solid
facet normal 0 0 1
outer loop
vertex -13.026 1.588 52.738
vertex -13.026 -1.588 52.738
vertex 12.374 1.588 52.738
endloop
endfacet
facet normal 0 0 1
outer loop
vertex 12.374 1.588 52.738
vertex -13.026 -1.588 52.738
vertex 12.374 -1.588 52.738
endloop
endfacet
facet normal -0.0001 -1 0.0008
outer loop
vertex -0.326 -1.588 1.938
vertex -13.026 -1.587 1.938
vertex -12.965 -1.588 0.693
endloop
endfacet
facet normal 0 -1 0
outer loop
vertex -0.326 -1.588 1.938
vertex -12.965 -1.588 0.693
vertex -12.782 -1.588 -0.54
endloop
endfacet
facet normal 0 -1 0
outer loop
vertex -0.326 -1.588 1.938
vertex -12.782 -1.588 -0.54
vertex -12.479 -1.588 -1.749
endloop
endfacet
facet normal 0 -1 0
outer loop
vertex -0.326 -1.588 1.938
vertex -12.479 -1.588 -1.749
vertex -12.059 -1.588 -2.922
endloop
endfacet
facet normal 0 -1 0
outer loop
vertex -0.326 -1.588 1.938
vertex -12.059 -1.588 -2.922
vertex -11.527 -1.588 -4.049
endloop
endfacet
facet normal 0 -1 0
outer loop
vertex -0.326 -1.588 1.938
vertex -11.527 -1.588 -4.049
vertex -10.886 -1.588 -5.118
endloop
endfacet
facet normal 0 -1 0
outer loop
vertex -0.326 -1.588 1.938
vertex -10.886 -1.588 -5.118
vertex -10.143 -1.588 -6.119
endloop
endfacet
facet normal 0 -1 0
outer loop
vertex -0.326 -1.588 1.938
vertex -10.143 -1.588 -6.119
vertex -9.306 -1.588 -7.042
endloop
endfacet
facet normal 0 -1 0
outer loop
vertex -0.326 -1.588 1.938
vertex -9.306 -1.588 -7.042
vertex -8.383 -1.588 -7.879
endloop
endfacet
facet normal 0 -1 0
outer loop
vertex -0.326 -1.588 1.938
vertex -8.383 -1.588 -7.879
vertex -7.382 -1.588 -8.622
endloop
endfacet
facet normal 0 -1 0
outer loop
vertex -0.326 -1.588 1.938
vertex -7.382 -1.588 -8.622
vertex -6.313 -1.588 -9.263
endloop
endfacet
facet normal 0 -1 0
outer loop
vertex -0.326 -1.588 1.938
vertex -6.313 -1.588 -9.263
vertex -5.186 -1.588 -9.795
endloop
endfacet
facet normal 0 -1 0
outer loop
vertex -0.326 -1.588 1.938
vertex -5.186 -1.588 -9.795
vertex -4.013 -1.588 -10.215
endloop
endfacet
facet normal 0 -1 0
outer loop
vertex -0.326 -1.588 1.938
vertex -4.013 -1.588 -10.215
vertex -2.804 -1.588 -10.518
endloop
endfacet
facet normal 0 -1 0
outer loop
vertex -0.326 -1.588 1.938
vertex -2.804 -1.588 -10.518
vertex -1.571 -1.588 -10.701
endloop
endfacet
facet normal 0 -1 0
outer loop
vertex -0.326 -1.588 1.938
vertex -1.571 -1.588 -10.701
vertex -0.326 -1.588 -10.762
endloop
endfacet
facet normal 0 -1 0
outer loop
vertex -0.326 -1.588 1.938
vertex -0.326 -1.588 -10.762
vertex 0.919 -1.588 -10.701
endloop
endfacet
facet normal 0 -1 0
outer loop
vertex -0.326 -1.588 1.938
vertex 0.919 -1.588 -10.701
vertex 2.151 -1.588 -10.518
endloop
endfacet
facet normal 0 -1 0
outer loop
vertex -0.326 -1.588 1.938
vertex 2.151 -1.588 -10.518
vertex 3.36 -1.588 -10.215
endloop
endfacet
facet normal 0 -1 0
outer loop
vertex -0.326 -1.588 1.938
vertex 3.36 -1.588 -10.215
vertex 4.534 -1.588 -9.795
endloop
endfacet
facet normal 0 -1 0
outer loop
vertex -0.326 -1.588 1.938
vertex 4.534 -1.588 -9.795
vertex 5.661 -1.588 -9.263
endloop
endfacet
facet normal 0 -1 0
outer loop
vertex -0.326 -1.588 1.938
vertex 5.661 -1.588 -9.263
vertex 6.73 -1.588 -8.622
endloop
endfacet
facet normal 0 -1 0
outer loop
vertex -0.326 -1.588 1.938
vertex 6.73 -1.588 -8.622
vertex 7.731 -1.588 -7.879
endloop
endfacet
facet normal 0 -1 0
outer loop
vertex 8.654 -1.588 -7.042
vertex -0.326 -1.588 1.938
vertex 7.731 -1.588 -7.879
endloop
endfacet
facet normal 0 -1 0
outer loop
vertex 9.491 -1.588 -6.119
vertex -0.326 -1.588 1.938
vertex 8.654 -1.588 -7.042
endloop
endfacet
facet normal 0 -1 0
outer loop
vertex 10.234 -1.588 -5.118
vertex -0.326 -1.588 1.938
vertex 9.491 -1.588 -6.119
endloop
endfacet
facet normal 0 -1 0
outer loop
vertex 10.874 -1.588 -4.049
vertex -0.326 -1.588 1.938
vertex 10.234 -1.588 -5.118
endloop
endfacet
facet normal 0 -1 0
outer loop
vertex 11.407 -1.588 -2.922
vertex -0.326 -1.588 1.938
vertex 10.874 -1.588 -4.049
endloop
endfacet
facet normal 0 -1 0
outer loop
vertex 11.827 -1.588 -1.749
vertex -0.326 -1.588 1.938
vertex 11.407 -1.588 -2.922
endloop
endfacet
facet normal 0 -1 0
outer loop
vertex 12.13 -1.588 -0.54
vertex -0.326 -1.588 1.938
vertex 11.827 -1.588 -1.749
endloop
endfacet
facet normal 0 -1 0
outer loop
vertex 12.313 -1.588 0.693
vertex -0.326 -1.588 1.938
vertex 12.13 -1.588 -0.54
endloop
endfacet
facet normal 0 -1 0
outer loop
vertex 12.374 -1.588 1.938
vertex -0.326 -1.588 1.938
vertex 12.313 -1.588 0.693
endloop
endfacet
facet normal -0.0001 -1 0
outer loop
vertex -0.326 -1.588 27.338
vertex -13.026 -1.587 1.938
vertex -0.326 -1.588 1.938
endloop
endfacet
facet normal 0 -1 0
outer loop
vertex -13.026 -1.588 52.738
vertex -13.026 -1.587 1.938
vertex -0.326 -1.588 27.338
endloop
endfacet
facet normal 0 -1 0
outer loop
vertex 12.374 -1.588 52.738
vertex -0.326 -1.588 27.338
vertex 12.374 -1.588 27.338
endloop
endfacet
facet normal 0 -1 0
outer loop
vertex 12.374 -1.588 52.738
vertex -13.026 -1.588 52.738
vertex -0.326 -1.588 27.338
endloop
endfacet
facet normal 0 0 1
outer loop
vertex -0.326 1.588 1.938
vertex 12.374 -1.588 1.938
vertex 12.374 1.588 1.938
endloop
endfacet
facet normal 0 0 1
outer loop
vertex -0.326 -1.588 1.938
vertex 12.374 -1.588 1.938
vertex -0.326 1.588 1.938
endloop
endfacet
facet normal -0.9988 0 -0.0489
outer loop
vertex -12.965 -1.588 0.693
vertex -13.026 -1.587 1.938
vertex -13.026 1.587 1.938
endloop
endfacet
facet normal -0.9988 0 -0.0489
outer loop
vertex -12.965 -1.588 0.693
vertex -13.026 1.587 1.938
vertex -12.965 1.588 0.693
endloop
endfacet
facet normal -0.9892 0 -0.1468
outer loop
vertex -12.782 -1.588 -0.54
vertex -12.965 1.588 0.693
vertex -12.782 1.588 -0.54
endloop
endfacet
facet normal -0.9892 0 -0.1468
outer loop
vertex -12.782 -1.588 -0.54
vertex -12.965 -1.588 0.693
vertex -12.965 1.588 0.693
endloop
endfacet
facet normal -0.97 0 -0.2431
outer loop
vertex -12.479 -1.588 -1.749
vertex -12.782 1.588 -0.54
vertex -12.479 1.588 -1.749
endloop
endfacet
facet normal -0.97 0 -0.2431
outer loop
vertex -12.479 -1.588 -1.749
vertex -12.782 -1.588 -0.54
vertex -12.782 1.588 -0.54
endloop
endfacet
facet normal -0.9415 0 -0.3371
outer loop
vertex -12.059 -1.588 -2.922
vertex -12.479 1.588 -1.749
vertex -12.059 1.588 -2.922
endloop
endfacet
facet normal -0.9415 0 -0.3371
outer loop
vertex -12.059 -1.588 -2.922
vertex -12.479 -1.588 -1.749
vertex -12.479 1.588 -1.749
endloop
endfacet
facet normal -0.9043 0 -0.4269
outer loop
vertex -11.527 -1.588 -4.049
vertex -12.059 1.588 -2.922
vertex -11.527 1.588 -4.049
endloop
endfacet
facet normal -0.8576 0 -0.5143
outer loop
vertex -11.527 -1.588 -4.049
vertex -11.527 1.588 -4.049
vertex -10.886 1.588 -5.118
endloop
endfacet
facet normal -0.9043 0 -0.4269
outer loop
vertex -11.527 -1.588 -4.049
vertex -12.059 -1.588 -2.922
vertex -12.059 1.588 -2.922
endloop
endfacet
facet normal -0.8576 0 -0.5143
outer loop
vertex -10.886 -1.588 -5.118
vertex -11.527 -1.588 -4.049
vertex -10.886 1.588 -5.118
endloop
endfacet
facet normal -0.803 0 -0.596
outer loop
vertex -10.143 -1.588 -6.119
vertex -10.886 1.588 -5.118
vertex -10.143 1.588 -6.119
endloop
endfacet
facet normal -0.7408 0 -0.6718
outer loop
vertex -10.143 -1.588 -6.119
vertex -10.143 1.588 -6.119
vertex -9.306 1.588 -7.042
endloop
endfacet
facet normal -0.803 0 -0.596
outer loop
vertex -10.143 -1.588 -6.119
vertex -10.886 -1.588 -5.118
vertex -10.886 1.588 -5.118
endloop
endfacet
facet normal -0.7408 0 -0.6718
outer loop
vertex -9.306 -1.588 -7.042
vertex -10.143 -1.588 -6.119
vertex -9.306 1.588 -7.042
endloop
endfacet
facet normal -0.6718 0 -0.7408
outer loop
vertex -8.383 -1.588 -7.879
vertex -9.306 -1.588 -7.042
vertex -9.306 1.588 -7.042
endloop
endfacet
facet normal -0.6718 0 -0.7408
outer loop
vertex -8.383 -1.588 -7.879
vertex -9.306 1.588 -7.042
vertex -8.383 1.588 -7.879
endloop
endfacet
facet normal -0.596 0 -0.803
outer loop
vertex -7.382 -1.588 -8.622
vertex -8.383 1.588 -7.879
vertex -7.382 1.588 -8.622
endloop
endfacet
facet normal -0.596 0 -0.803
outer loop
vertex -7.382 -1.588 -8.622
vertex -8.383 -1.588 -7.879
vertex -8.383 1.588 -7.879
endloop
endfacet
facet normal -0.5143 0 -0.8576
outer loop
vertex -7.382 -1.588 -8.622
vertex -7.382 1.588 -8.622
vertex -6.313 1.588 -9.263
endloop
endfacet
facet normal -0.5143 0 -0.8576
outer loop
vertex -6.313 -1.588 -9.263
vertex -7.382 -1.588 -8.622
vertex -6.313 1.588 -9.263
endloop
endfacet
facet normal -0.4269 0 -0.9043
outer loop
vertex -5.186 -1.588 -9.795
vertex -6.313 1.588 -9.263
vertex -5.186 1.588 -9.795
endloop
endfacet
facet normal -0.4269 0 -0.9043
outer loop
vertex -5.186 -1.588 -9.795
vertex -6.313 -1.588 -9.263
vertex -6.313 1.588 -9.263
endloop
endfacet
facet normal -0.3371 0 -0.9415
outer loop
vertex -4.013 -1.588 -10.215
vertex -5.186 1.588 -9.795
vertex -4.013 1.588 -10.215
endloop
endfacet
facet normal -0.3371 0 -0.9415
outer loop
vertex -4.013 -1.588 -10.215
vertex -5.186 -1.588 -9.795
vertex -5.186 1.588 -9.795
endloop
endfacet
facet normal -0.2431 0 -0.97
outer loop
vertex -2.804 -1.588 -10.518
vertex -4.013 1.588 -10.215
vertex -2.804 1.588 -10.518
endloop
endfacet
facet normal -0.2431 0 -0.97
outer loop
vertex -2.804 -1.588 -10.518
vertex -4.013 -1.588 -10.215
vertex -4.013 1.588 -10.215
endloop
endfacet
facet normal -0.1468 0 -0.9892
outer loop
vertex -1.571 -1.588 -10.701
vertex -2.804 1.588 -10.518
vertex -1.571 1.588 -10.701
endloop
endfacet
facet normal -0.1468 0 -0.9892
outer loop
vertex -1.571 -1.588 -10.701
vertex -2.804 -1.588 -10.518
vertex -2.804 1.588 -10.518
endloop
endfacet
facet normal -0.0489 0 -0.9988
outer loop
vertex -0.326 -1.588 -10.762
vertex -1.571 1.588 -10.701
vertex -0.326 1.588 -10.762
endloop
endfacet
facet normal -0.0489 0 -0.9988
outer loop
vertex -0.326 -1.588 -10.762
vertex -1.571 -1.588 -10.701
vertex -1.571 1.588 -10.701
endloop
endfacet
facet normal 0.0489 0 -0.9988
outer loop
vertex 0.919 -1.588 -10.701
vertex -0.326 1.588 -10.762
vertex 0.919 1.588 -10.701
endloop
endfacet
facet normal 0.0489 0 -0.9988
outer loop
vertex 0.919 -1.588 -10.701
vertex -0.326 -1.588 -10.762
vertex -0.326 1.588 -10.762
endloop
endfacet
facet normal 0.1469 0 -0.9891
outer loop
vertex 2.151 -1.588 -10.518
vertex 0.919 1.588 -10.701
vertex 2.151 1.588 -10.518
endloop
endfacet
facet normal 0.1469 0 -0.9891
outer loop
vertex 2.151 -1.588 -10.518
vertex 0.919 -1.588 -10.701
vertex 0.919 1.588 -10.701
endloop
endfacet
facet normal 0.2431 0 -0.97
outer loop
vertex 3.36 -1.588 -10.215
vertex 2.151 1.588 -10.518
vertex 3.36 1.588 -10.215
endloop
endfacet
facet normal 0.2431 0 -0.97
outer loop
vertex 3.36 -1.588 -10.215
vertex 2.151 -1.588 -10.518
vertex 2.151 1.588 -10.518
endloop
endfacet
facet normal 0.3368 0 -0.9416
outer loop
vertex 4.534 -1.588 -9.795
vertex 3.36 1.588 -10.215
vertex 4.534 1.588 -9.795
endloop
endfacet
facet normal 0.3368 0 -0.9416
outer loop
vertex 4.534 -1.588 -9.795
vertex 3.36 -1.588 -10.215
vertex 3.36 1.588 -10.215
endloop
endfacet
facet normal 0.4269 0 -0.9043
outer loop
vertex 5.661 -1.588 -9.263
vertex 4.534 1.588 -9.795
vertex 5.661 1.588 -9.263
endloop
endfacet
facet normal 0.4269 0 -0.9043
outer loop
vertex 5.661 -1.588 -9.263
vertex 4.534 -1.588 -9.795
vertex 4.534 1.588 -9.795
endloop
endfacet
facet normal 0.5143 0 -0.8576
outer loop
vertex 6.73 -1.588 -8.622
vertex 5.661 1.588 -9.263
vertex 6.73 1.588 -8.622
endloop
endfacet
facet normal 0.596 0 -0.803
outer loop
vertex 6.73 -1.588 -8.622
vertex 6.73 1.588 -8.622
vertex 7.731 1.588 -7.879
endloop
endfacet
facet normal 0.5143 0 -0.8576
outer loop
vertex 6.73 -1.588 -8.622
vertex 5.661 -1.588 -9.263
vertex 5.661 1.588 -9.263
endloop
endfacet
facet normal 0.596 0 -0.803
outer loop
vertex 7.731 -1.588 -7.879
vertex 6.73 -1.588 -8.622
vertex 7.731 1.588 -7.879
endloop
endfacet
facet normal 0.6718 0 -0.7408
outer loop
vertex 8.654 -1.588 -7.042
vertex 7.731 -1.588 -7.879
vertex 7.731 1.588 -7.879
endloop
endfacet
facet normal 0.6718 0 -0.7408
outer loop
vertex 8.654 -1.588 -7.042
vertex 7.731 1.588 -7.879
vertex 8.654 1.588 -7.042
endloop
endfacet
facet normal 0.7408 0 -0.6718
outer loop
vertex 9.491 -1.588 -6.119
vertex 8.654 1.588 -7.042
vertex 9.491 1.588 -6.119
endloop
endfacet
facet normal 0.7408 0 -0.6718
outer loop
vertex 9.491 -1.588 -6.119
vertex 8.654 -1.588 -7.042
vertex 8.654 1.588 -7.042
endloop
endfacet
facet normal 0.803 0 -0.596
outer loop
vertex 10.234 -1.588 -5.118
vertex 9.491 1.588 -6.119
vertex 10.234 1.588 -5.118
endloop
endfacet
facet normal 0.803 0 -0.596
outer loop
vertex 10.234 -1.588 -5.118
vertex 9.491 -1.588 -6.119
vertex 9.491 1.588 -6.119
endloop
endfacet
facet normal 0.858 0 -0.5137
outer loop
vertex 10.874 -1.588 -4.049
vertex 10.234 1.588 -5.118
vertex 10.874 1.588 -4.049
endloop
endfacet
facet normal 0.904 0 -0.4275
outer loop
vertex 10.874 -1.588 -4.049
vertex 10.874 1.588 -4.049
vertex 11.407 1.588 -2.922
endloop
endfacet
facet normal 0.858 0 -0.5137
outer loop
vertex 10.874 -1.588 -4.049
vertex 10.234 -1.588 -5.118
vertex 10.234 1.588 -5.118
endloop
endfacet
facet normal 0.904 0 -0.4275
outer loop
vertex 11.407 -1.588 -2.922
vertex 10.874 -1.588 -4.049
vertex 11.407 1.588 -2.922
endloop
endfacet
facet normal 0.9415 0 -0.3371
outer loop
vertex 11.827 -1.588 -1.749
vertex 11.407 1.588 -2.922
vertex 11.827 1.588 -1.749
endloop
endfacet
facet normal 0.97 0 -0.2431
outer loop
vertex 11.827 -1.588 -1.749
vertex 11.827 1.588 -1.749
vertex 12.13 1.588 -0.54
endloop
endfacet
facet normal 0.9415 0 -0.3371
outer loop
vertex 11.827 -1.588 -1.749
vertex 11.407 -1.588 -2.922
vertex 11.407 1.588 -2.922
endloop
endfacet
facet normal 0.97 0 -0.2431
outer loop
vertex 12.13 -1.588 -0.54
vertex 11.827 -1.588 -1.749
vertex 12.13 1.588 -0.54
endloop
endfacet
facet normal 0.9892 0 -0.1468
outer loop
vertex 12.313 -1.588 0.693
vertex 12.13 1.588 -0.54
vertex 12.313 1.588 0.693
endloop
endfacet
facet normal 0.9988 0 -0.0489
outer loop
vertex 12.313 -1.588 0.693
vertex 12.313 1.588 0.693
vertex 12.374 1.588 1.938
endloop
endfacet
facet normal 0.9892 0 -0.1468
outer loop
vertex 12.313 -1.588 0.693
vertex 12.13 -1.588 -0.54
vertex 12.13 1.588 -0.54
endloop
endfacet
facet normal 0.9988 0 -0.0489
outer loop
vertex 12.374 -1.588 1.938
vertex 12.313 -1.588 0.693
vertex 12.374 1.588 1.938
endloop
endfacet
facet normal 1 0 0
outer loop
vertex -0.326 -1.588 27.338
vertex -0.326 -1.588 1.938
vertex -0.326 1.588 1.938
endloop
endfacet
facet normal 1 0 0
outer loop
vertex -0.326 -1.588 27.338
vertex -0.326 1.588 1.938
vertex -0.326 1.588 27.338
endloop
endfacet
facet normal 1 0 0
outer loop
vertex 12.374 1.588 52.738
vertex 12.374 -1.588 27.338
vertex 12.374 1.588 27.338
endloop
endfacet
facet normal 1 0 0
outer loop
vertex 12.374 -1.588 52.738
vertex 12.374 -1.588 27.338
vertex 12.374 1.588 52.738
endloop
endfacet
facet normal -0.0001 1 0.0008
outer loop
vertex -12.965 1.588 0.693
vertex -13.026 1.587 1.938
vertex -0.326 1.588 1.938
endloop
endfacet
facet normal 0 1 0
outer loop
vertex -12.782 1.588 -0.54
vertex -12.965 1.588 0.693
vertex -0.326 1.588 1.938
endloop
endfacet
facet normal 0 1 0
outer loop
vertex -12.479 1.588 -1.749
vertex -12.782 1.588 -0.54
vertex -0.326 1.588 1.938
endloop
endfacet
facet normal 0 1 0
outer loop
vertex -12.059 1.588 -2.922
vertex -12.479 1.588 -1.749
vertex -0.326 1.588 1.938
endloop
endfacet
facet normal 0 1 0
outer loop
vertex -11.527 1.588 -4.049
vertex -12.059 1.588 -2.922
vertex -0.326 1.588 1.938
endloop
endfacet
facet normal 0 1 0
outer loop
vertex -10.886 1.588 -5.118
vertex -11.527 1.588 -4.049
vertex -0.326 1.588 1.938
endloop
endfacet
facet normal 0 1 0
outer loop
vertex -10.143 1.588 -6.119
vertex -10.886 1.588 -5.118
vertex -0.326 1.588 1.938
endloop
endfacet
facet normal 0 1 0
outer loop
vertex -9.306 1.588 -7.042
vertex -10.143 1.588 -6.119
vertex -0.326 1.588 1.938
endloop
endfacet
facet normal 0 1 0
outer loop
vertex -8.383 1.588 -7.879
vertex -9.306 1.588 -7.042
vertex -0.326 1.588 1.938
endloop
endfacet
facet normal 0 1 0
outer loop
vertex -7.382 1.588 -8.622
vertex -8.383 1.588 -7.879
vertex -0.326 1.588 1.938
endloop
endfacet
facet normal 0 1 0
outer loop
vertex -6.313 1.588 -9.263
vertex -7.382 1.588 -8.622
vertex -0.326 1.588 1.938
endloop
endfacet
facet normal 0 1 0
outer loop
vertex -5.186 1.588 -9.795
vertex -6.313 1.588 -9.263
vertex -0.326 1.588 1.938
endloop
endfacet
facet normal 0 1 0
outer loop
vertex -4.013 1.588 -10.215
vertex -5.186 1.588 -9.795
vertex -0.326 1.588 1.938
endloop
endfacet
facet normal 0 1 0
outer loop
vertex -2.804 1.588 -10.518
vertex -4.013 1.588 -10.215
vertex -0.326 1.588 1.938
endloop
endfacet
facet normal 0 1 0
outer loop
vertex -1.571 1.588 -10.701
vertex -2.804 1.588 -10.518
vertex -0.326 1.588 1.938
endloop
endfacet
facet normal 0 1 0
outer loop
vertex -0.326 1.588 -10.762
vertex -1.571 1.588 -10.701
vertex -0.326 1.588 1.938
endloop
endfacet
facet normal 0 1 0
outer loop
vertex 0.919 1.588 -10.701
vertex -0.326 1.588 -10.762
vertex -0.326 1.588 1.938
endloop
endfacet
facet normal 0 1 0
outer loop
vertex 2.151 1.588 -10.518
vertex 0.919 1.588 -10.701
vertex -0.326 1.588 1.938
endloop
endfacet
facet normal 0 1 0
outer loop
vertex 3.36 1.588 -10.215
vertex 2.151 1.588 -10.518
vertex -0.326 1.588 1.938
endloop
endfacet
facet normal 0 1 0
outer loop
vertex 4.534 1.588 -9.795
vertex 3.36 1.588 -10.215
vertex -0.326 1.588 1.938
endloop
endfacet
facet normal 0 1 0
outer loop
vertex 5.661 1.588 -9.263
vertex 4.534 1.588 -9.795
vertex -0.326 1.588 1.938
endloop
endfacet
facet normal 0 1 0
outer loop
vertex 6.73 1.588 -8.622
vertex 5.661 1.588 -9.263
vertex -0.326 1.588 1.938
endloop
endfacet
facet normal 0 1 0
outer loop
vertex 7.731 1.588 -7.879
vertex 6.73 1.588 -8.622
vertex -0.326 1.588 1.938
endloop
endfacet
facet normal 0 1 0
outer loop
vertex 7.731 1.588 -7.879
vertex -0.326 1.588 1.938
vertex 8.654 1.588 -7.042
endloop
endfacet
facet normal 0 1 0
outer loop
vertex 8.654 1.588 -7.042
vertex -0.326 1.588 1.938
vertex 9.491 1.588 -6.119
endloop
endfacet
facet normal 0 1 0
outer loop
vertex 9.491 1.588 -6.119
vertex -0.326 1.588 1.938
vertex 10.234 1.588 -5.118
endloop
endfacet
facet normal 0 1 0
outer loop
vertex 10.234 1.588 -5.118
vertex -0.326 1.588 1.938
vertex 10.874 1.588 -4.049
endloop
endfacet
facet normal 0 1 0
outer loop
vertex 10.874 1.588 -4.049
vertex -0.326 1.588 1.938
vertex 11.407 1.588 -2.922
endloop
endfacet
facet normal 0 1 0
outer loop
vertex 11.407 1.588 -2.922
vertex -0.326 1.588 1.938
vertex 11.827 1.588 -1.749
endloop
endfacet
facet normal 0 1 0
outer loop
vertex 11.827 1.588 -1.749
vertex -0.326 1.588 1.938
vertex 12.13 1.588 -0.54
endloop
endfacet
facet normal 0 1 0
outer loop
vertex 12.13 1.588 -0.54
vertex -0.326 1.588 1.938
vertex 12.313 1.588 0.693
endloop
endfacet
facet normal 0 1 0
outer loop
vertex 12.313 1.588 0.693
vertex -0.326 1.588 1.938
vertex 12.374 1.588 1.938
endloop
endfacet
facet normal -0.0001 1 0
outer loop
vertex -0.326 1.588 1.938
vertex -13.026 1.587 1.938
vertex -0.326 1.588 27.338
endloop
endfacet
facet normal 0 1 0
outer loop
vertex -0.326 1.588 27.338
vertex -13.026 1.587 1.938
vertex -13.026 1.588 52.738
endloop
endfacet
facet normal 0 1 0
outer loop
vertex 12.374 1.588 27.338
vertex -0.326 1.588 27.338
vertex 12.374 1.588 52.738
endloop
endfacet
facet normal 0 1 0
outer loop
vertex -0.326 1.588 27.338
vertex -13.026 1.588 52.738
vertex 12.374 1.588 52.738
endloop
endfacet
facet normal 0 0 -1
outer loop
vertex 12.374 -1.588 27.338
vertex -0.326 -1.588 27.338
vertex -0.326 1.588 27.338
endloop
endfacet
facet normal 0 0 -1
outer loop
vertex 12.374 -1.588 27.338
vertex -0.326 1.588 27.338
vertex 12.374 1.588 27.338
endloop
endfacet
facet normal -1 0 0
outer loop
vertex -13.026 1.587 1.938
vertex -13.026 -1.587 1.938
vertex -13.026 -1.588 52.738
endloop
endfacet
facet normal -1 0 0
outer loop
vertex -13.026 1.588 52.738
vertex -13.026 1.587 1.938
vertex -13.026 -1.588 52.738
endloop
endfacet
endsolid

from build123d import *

# Parameters (mm, degrees)
F0_W     = 25.4
F0_H     = 25.4
F1_DEPTH = 1.5875
F2_W     = 12.7
F2_H     = 25.4
F3_DEPTH = 3.175
F5_DEPTH = 3.175


with BuildPart() as f1:
    # F0 (on Front) → F1 (new body, symmetric)
    with BuildSketch(Plane.XZ):
        with Locations((-0.326153, 40.037792)):
            Rectangle(F0_W, F0_H)
    extrude(amount=F1_DEPTH, both=True)

    # F2 (on face) → F3 (join)
    with BuildSketch(Plane.XZ.offset(1.5875)):
        with Locations((-6.676153, 14.637792)):
            Rectangle(F2_W, F2_H)
    extrude(amount=-F3_DEPTH)

    # F4 (on face) → F5 (join)
    with BuildSketch(Plane.XZ.offset(1.5875)):
        with BuildLine():
            Line((12.373847, 1.937792), (-13.026153, 1.937792))
            ThreePointArc((-13.026153, 1.937792), (-0.326153, -10.762208), (12.373847, 1.937792))
        make_face()
    extrude(amount=-F5_DEPTH)


solid = f1.part
